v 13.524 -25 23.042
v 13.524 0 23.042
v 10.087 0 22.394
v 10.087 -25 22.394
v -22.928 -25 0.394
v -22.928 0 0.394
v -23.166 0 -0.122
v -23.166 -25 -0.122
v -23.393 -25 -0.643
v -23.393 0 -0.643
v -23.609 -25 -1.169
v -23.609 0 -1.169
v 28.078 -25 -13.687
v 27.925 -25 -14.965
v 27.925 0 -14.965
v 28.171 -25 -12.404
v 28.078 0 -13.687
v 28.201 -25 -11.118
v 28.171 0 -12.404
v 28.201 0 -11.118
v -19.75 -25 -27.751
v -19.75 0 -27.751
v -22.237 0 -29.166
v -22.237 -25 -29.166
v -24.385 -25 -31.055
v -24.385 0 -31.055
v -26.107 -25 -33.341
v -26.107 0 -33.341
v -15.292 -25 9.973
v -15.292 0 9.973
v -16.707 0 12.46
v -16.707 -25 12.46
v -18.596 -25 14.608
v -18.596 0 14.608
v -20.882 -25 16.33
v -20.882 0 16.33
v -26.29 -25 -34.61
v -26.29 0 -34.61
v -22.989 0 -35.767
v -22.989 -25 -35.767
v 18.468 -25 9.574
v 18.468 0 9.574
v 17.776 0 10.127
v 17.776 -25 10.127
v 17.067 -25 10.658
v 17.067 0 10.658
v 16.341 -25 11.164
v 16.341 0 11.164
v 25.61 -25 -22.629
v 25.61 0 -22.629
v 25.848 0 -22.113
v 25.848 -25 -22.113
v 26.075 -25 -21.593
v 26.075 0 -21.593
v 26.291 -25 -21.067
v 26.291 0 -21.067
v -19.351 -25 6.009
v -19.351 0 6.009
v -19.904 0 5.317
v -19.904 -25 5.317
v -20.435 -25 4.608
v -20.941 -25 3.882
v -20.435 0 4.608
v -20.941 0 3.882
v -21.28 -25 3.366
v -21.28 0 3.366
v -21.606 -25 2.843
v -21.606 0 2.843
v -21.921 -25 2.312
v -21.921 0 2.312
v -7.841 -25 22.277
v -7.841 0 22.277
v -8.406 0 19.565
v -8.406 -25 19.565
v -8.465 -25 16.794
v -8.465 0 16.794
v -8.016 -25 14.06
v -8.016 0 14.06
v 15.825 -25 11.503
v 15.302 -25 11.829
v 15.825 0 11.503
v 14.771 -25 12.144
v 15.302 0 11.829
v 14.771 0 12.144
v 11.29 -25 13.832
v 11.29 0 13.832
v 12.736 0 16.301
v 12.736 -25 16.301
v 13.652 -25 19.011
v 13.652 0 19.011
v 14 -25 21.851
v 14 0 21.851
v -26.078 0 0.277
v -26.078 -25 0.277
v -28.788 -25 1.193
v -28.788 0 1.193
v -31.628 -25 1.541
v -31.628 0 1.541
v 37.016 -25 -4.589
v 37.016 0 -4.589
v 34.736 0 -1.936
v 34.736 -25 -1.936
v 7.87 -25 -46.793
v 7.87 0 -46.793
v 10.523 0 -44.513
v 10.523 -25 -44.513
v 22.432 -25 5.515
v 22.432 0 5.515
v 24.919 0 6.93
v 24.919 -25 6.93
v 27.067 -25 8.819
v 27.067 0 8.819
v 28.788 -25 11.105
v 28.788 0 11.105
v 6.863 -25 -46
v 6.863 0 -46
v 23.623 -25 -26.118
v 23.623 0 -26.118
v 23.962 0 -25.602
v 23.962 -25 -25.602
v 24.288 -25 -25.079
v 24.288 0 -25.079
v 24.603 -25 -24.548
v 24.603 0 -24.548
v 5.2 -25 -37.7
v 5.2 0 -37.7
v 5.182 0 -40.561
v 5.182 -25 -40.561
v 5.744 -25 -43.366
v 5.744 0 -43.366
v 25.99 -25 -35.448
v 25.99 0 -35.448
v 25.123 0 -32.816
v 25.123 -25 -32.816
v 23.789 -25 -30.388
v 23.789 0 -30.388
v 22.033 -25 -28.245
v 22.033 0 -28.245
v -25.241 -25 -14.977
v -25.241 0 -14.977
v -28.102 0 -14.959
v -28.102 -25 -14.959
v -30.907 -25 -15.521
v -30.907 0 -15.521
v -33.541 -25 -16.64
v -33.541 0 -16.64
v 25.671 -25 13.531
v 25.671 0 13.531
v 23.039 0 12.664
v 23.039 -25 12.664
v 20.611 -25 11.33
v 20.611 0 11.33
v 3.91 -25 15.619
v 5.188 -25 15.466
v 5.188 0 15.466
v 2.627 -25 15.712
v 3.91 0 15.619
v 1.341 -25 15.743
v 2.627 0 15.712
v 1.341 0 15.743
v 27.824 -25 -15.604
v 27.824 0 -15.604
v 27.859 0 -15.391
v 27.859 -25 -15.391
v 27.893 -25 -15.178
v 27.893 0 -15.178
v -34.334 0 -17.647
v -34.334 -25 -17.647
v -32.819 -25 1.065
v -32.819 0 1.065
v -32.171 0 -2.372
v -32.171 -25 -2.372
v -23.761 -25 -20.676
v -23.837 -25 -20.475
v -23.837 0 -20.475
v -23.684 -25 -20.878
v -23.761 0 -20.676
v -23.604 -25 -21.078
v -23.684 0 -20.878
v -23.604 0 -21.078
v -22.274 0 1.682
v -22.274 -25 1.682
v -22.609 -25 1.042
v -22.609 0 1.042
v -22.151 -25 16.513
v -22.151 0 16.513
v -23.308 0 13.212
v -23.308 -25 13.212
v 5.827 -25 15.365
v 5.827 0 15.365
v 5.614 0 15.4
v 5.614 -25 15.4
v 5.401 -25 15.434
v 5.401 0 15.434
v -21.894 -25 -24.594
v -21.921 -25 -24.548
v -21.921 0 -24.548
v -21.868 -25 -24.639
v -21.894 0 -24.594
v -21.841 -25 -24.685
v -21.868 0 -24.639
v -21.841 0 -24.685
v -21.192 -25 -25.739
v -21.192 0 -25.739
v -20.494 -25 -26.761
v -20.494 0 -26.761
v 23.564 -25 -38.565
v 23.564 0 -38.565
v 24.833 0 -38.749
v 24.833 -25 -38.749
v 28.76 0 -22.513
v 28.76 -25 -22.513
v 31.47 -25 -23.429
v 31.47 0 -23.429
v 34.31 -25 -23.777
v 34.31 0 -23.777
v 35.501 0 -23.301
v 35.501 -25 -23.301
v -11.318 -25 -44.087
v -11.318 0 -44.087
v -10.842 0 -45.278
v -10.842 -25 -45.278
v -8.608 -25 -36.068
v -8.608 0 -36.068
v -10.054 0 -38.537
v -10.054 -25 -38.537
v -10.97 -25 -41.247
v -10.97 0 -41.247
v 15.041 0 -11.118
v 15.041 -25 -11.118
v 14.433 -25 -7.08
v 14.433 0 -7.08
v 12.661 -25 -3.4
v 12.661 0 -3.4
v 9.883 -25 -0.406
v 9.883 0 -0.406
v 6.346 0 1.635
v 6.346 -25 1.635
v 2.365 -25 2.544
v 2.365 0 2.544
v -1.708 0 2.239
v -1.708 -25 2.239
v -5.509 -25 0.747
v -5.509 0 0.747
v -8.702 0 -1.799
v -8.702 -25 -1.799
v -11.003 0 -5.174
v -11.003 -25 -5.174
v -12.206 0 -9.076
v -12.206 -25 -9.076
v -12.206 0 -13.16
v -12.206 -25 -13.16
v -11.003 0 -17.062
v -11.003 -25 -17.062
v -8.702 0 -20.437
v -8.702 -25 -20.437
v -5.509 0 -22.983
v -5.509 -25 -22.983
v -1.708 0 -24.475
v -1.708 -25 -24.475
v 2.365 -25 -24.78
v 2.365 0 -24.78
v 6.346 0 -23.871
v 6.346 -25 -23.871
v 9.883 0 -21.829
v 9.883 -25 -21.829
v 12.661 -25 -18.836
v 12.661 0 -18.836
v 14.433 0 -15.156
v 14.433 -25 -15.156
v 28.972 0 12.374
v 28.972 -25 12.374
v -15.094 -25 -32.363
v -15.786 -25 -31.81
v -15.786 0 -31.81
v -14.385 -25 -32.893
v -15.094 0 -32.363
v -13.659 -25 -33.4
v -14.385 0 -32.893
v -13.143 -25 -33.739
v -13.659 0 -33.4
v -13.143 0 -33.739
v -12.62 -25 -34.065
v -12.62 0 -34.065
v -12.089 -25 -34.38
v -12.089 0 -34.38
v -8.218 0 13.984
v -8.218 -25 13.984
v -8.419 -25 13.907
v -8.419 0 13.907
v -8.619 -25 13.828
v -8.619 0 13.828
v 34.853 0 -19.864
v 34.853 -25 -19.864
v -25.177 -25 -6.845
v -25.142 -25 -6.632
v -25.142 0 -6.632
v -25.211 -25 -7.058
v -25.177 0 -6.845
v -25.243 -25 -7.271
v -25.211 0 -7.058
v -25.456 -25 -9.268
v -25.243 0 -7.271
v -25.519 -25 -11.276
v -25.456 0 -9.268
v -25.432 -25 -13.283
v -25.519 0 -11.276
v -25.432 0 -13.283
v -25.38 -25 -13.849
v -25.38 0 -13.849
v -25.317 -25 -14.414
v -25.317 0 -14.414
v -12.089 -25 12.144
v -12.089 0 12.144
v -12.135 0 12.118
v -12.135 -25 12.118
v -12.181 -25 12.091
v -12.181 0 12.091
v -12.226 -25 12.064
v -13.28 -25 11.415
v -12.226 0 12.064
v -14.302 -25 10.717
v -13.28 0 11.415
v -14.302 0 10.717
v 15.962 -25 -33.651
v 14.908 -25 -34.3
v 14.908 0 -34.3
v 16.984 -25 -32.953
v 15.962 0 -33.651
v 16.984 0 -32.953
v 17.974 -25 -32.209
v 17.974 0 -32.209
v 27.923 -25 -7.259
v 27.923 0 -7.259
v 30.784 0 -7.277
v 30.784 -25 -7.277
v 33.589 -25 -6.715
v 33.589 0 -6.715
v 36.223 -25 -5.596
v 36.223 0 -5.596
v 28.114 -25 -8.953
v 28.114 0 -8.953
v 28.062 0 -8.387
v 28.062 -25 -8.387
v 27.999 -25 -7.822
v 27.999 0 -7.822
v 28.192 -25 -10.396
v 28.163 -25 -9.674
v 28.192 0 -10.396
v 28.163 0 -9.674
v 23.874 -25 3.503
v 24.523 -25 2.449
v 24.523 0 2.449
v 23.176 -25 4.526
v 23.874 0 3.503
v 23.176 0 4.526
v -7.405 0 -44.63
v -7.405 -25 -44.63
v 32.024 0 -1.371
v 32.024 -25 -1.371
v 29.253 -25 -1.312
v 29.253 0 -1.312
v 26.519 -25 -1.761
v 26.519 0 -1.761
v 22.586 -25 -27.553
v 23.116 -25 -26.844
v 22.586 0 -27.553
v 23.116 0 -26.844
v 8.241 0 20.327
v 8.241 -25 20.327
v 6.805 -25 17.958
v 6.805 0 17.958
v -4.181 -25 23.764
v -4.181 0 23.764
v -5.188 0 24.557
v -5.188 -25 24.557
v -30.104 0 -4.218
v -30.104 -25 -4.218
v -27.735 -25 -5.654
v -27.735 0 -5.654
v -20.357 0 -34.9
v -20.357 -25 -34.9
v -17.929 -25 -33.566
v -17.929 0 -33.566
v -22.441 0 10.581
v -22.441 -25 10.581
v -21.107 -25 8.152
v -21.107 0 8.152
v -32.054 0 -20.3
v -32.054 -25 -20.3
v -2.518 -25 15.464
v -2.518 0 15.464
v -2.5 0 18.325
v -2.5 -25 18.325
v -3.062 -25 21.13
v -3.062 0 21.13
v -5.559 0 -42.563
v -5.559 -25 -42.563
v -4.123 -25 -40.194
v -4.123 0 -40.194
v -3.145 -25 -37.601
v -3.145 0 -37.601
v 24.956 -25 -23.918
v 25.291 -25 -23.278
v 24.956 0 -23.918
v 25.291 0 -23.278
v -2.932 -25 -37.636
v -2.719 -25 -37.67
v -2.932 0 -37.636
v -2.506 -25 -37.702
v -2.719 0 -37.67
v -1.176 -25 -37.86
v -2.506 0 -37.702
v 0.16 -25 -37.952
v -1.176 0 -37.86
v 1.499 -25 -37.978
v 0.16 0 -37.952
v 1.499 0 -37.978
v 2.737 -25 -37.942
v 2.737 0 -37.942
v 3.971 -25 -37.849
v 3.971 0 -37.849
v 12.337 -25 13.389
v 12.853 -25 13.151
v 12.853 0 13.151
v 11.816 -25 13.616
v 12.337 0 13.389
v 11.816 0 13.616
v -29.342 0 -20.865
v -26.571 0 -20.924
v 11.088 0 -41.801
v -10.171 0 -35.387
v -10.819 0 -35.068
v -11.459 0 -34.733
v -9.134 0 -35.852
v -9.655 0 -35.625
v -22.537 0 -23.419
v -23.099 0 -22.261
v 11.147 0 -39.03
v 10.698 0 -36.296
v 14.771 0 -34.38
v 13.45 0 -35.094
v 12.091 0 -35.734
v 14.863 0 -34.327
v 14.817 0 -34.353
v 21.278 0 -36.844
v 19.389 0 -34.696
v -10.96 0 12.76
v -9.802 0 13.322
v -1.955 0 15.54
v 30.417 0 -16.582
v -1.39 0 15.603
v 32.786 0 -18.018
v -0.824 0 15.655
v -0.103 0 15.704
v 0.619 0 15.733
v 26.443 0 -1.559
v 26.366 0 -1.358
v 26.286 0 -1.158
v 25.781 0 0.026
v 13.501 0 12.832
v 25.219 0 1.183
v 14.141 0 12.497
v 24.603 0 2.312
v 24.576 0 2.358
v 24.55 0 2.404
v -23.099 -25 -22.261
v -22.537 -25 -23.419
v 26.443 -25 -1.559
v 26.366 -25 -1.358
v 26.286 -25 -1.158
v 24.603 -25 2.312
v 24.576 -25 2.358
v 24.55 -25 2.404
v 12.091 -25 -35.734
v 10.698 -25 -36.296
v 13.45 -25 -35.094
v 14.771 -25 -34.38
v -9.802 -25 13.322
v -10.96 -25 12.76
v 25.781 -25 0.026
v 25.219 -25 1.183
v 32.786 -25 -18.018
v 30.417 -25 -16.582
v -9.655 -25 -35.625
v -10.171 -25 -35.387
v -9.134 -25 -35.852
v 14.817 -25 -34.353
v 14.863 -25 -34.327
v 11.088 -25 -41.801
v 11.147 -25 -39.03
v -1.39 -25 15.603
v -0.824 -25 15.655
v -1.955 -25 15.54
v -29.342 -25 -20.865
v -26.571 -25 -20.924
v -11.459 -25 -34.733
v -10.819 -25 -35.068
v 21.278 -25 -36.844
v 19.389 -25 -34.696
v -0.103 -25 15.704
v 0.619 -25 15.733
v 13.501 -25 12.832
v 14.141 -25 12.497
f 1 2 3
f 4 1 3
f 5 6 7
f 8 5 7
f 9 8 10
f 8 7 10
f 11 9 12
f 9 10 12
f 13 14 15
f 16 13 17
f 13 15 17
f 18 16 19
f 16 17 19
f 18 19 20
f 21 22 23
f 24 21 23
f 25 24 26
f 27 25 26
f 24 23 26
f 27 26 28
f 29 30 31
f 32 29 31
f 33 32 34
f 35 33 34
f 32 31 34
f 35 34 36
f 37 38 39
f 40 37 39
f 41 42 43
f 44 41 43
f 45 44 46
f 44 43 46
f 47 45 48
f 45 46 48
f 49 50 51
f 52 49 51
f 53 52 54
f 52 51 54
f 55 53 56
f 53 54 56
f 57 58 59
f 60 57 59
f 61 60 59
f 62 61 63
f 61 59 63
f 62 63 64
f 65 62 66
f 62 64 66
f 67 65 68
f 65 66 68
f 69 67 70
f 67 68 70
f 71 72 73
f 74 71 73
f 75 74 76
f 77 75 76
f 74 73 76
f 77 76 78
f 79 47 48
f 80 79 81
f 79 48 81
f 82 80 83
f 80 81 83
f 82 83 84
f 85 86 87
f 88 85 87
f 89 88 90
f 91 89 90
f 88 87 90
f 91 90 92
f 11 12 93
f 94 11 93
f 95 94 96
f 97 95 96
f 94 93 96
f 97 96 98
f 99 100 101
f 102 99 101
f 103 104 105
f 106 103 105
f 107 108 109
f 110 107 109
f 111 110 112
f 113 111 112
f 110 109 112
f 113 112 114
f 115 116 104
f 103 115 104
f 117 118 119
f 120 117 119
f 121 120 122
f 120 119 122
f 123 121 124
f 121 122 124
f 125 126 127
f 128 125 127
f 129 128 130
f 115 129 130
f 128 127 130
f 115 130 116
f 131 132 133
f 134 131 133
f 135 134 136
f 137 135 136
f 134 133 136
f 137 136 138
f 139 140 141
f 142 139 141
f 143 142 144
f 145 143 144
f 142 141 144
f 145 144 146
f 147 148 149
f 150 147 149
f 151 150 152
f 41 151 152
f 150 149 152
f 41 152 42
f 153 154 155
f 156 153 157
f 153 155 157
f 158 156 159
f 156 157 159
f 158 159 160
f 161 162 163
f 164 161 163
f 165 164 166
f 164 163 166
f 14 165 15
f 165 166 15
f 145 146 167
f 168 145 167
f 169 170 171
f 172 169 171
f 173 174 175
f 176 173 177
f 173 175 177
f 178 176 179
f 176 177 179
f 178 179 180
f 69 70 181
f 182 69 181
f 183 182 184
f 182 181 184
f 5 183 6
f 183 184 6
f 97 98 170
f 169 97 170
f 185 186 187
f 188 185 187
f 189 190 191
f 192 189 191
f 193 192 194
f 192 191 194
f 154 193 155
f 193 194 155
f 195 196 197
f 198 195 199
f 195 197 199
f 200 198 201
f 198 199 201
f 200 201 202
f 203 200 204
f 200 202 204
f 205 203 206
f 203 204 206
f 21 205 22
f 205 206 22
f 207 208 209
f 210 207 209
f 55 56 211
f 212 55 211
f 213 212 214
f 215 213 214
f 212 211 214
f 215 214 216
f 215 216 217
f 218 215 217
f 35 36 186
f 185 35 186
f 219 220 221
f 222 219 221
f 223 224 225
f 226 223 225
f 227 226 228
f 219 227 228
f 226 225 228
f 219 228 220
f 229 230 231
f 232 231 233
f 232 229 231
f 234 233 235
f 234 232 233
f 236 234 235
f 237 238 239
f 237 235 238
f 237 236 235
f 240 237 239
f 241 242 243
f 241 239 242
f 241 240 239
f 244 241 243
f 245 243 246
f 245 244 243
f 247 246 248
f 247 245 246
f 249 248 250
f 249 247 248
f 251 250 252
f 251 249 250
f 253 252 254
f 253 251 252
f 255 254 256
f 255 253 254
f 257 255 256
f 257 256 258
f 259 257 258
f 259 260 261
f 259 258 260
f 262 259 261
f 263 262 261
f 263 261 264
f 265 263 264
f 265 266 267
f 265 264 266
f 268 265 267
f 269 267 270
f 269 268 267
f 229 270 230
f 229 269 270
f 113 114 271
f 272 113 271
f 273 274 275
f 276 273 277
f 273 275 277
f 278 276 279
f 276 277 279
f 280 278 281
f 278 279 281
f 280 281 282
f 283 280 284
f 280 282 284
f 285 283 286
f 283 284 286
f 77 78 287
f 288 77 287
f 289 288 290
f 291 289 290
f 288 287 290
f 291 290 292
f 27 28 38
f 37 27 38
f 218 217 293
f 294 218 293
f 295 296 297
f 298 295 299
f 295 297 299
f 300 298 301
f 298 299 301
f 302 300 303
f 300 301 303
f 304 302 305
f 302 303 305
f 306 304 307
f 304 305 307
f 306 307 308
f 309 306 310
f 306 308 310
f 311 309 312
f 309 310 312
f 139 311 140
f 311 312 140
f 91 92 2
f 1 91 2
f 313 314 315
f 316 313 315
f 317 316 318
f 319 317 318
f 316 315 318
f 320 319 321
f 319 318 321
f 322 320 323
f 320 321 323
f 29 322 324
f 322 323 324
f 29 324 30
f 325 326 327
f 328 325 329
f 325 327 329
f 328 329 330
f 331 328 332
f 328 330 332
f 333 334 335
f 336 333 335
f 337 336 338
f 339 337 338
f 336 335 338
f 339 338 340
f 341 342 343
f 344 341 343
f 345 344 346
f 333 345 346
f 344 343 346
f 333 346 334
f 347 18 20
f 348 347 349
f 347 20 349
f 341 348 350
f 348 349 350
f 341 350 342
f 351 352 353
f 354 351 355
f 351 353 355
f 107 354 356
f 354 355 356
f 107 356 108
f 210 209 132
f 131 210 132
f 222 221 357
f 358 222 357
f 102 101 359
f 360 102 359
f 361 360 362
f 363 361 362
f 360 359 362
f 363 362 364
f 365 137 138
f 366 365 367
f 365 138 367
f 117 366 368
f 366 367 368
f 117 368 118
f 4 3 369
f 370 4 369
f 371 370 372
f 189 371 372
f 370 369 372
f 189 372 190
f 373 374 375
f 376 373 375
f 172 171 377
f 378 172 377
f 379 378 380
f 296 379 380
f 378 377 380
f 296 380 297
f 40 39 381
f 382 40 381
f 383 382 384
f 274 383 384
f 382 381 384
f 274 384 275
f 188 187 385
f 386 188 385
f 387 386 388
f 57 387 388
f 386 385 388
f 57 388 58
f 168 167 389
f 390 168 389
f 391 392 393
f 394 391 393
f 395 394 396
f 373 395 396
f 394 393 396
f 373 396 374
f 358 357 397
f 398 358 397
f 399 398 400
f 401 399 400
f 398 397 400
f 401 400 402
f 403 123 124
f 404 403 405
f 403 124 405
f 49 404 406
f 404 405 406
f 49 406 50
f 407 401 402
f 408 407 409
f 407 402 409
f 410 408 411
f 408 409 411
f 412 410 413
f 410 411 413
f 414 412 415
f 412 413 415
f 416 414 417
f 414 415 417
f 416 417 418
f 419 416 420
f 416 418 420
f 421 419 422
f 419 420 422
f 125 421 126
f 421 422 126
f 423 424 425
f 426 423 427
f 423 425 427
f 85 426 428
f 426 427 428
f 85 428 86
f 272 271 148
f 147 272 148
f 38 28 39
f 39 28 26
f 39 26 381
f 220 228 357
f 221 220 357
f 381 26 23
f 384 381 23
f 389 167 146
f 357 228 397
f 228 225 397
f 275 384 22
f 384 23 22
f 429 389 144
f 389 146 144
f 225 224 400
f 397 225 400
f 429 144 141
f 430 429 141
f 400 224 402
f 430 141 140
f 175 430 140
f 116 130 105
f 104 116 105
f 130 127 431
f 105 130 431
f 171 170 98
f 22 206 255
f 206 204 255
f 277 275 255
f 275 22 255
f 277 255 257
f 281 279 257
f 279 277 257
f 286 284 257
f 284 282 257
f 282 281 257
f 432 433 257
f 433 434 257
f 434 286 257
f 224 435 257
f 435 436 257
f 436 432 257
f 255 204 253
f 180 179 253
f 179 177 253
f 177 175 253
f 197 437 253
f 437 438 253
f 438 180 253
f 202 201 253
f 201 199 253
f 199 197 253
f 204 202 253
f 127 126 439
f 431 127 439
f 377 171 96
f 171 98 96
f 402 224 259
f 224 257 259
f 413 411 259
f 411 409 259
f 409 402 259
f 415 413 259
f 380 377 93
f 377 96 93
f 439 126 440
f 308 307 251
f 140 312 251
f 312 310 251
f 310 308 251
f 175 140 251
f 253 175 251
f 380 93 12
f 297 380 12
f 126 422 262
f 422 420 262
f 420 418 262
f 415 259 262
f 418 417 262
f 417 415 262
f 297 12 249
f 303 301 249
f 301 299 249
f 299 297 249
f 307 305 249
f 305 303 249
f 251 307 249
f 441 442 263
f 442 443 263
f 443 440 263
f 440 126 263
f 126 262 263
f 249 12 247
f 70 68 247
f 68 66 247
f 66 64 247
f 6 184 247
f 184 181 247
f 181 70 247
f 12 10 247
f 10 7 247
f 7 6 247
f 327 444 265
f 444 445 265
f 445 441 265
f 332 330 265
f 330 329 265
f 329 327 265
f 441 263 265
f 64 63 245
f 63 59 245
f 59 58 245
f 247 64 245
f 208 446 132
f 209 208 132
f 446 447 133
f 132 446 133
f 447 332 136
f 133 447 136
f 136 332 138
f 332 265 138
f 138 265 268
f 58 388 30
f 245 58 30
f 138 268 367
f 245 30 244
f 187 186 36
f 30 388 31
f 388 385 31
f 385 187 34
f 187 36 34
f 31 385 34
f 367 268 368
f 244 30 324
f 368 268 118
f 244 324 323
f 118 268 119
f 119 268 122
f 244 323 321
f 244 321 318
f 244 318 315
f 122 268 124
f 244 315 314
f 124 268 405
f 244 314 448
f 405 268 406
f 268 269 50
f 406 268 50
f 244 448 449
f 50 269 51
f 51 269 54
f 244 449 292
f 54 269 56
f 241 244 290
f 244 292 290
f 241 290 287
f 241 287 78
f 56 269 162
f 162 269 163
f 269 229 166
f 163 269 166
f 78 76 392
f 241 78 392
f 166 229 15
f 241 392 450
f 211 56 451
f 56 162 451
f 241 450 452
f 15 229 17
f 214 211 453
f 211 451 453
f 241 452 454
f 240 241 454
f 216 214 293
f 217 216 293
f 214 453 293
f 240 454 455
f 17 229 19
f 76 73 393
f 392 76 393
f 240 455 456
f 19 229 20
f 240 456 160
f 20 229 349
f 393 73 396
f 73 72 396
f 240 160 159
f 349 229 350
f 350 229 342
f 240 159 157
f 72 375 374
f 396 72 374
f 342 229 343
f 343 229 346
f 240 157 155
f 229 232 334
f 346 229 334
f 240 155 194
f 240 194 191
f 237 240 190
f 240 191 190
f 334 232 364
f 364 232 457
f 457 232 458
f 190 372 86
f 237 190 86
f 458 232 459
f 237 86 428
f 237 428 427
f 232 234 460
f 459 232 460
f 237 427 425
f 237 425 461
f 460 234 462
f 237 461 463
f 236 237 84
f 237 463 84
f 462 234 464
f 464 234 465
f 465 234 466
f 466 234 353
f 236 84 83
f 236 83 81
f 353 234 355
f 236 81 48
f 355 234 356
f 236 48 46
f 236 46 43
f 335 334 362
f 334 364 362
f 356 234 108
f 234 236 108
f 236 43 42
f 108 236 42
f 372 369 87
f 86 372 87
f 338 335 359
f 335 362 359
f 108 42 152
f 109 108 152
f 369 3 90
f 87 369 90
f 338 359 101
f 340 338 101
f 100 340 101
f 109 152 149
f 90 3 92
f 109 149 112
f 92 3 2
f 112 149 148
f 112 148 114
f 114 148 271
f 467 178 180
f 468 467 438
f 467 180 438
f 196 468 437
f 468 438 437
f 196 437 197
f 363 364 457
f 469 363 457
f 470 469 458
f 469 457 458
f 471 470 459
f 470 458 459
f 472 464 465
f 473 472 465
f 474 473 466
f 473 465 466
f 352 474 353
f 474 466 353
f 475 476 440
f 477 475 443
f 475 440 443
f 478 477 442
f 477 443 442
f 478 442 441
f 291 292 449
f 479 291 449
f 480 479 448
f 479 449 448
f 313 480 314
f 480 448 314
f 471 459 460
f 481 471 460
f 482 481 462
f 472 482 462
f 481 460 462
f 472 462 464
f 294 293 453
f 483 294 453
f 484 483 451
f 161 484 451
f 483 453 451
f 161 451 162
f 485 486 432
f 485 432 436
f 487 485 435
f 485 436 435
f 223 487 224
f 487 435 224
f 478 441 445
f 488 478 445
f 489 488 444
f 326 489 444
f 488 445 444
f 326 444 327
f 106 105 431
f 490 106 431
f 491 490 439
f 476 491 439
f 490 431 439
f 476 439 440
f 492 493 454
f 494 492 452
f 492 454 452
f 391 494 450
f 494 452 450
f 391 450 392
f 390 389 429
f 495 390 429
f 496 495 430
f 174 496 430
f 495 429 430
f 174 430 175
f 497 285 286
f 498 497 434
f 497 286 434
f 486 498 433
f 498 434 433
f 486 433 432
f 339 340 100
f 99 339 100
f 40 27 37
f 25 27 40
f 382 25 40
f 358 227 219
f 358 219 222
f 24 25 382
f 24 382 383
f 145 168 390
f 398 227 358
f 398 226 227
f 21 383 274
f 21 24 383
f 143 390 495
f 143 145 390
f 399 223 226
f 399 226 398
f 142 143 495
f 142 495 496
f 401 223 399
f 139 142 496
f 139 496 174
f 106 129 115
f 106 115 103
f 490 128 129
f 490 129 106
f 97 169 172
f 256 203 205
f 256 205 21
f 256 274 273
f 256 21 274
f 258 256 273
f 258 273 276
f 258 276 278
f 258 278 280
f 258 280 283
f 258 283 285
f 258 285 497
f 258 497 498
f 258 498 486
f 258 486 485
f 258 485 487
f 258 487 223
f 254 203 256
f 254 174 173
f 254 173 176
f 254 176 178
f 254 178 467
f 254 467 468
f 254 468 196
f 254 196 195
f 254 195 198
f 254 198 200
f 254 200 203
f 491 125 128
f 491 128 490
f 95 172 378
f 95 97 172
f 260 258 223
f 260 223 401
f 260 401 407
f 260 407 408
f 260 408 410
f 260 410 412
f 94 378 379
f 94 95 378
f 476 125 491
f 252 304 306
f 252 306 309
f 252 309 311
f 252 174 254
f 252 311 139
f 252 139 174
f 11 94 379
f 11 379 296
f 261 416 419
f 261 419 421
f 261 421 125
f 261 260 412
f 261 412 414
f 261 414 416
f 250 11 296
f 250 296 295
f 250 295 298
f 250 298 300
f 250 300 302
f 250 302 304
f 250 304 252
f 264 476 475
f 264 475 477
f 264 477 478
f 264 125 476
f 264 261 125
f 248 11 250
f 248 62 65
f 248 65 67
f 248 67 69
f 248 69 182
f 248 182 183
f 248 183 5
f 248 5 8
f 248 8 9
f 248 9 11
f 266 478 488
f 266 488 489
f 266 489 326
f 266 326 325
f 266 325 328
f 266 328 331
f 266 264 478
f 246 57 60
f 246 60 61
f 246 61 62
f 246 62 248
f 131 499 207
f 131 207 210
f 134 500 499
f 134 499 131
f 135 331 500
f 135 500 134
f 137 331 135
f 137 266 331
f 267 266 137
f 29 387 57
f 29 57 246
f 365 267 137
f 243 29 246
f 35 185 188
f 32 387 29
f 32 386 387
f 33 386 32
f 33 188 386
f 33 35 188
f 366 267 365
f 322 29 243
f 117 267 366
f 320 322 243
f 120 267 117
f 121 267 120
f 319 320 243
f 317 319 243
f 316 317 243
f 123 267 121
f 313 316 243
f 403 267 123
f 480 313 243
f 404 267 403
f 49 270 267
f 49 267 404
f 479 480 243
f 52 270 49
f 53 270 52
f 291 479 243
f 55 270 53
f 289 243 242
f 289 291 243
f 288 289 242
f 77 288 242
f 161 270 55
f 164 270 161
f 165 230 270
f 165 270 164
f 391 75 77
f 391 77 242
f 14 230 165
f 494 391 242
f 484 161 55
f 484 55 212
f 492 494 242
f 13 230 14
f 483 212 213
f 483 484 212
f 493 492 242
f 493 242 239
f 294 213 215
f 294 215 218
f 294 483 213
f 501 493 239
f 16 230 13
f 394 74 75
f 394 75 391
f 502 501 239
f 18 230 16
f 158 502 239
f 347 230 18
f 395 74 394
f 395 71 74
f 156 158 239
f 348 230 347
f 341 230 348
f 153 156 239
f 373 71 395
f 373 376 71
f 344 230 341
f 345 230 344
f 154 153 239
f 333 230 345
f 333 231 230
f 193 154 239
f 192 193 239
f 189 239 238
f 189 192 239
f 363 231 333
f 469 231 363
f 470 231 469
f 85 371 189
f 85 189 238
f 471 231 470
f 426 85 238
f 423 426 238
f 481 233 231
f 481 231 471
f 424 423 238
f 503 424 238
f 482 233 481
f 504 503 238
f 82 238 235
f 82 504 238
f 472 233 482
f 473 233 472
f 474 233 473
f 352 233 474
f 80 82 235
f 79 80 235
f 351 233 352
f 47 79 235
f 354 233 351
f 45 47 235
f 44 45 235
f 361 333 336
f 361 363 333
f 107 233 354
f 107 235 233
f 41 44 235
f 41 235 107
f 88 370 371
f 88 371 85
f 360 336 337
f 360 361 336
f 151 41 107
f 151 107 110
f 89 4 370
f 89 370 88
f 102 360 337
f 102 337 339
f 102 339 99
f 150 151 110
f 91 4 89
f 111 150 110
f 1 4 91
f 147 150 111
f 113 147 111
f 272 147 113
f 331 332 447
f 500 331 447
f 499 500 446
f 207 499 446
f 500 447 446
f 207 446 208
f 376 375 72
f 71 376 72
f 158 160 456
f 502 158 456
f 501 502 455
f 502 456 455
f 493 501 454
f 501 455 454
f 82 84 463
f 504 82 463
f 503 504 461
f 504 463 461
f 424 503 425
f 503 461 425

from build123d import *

# Parameters (mm, degrees)
F0_R     = 13.7004804212
F1_DEPTH = 25
F2_COUNT = 12


with BuildPart() as f1:
    # F0 (on Front) → F1 (new body)
    with BuildSketch(Plane.XZ):
        with BuildLine():
            ThreePointArc((5.1877617459, 15.4656955182), (1.3348337551, 15.7425763881), (-2.5179670171, 15.4639308632))
            ThreePointArc((-2.5179670171, 15.4639308632), (-5.3039752447, 14.9076599703), (-8.0156462094, 14.0602405167))
            ThreePointArc((-8.0156462094, 14.0602405167), (-10.1642311279, 13.1537985607), (-12.2260978725, 12.064413551))
            ThreePointArc((-12.2260978725, 12.064413551), (-14.7363892101, 10.3996164513), (-17.044498214, 8.4642237758))
            ThreePointArc((-17.044498214, 8.4642237758), (-19.1213988999, 6.2825744141), (-20.9409732492, 3.8821037136))
            ThreePointArc((-20.9409732492, 3.8821037136), (-22.4803390837, 1.292998939), (-23.7201379517, -1.4521803764))
            ThreePointArc((-23.7201379517, -1.4521803764), (-24.6447786512, -4.3189119634), (-25.2426333118, -7.2711450539))
            ThreePointArc((-25.2426333118, -7.2711450539), (-25.5061835733, -10.2717538785), (-25.4321150685, -13.2830037711))
            ThreePointArc((-25.4321150685, -13.2830037711), (-25.0213593458, -16.2670260316), (-24.2790819112, -19.1862953452))
            ThreePointArc((-24.2790819112, -19.1862953452), (-23.2146169595, -22.0041010545), (-21.8413509371, -24.6850067))
            ThreePointArc((-21.8413509371, -24.6850067), (-20.1765542068, -27.195297335), (-18.2411620449, -29.5034057391))
            ThreePointArc((-18.2411620449, -29.5034057391), (-16.0595125704, -31.5803065899), (-13.6590417261, -33.3998810729))
            ThreePointArc((-13.6590417261, -33.3998810729), (-11.0699368198, -34.9392469858), (-8.3247573578, -36.1790459013))
            ThreePointArc((-8.3247573578, -36.1790459013), (-5.4580256945, -37.1036865942), (-2.5057925274, -37.701541232))
            ThreePointArc((-2.5057925274, -37.701541232), (0.494815816, -37.9650914367), (3.5060652253, -37.8910229838))
            ThreePointArc((3.5060652253, -37.8910229838), (6.490087912, -37.4802672463), (9.4093576356, -36.7379897032))
            ThreePointArc((9.4093576356, -36.7379897032), (12.2271632206, -35.6735247759), (14.9080687518, -34.3002588042))
            ThreePointArc((14.9080687518, -34.3002588042), (17.418359676, -32.6354618578), (19.7264683173, -30.7000694179))
            ThreePointArc((19.7264683173, -30.7000694179), (21.8033689519, -28.5184200728), (23.6229432563, -26.1179493978))
            ThreePointArc((23.6229432563, -26.1179493978), (25.1623091778, -23.5288444178), (26.4021080868, -20.7836648785))
            ThreePointArc((26.4021080868, -20.7836648785), (27.3267486462, -17.9169335612), (27.9246032308, -14.9647007613))
            ThreePointArc((27.9246032308, -14.9647007613), (28.132175105, -13.0462877166), (28.2014849595, -11.1179229076))
            ThreePointArc((28.2014849595, -11.1179229076), (28.1796260721, -10.0345007945), (28.1140849874, -8.9528420441))
            ThreePointArc((28.1140849874, -8.9528420441), (27.7033292139, -5.9688195233), (26.9610516709, -3.0495499642))
            ThreePointArc((26.9610516709, -3.0495499642), (25.8965868926, -0.2317447927), (24.5233211592, 2.4491603668))
            ThreePointArc((24.5233211592, 2.4491603668), (22.8585242407, 4.9594513659), (20.923131816, 7.2675600815))
            ThreePointArc((20.923131816, 7.2675600815), (18.7414824625, 9.3444607976), (16.3410117658, 11.1640351765))
            ThreePointArc((16.3410117658, 11.1640351765), (13.7519066478, 12.703401218), (11.0067269497, 13.9432002123))
            ThreePointArc((11.0067269497, 13.9432002123), (8.1399951015, 14.867840913), (5.1877617459, 15.4656955182))
        make_face()
        with Locations((1.3409849595, -11.1179229076)):
            Circle(F0_R, mode=Mode.SUBTRACT)
        with BuildLine():
            ThreePointArc((-8.0156462094, 14.0602405167), (-5.3039752447, 14.9076599703), (-2.5179670171, 15.4639308632))
            ThreePointArc((-2.5179670171, 15.4639308632), (-2.7094878329, 19.7420226798), (-4.1807882522, 23.7637169608))
            Line((-4.1807882522, 23.7637169608), (-5.1883789909, 24.5569822892))
            Line((-5.1883789909, 24.5569822892), (-7.8406668751, 22.2773347298))
            ThreePointArc((-7.8406668751, 22.2773347298), (-8.4992599438, 18.1809490139), (-8.0156462094, 14.0602405167))
        make_face()
    extrude(amount=F1_DEPTH)

    # F2: F1 ×12 about axis
    f2_axis = Axis((1.3409849595, 0, -11.1179229076), (0, 1, 0))


with BuildPart() as f1_1:
    add(f1.part)
    for i in range(1, F2_COUNT):
        add(f1.part.rotate(f2_axis, i * 360 / F2_COUNT))


solid = f1_1.part
